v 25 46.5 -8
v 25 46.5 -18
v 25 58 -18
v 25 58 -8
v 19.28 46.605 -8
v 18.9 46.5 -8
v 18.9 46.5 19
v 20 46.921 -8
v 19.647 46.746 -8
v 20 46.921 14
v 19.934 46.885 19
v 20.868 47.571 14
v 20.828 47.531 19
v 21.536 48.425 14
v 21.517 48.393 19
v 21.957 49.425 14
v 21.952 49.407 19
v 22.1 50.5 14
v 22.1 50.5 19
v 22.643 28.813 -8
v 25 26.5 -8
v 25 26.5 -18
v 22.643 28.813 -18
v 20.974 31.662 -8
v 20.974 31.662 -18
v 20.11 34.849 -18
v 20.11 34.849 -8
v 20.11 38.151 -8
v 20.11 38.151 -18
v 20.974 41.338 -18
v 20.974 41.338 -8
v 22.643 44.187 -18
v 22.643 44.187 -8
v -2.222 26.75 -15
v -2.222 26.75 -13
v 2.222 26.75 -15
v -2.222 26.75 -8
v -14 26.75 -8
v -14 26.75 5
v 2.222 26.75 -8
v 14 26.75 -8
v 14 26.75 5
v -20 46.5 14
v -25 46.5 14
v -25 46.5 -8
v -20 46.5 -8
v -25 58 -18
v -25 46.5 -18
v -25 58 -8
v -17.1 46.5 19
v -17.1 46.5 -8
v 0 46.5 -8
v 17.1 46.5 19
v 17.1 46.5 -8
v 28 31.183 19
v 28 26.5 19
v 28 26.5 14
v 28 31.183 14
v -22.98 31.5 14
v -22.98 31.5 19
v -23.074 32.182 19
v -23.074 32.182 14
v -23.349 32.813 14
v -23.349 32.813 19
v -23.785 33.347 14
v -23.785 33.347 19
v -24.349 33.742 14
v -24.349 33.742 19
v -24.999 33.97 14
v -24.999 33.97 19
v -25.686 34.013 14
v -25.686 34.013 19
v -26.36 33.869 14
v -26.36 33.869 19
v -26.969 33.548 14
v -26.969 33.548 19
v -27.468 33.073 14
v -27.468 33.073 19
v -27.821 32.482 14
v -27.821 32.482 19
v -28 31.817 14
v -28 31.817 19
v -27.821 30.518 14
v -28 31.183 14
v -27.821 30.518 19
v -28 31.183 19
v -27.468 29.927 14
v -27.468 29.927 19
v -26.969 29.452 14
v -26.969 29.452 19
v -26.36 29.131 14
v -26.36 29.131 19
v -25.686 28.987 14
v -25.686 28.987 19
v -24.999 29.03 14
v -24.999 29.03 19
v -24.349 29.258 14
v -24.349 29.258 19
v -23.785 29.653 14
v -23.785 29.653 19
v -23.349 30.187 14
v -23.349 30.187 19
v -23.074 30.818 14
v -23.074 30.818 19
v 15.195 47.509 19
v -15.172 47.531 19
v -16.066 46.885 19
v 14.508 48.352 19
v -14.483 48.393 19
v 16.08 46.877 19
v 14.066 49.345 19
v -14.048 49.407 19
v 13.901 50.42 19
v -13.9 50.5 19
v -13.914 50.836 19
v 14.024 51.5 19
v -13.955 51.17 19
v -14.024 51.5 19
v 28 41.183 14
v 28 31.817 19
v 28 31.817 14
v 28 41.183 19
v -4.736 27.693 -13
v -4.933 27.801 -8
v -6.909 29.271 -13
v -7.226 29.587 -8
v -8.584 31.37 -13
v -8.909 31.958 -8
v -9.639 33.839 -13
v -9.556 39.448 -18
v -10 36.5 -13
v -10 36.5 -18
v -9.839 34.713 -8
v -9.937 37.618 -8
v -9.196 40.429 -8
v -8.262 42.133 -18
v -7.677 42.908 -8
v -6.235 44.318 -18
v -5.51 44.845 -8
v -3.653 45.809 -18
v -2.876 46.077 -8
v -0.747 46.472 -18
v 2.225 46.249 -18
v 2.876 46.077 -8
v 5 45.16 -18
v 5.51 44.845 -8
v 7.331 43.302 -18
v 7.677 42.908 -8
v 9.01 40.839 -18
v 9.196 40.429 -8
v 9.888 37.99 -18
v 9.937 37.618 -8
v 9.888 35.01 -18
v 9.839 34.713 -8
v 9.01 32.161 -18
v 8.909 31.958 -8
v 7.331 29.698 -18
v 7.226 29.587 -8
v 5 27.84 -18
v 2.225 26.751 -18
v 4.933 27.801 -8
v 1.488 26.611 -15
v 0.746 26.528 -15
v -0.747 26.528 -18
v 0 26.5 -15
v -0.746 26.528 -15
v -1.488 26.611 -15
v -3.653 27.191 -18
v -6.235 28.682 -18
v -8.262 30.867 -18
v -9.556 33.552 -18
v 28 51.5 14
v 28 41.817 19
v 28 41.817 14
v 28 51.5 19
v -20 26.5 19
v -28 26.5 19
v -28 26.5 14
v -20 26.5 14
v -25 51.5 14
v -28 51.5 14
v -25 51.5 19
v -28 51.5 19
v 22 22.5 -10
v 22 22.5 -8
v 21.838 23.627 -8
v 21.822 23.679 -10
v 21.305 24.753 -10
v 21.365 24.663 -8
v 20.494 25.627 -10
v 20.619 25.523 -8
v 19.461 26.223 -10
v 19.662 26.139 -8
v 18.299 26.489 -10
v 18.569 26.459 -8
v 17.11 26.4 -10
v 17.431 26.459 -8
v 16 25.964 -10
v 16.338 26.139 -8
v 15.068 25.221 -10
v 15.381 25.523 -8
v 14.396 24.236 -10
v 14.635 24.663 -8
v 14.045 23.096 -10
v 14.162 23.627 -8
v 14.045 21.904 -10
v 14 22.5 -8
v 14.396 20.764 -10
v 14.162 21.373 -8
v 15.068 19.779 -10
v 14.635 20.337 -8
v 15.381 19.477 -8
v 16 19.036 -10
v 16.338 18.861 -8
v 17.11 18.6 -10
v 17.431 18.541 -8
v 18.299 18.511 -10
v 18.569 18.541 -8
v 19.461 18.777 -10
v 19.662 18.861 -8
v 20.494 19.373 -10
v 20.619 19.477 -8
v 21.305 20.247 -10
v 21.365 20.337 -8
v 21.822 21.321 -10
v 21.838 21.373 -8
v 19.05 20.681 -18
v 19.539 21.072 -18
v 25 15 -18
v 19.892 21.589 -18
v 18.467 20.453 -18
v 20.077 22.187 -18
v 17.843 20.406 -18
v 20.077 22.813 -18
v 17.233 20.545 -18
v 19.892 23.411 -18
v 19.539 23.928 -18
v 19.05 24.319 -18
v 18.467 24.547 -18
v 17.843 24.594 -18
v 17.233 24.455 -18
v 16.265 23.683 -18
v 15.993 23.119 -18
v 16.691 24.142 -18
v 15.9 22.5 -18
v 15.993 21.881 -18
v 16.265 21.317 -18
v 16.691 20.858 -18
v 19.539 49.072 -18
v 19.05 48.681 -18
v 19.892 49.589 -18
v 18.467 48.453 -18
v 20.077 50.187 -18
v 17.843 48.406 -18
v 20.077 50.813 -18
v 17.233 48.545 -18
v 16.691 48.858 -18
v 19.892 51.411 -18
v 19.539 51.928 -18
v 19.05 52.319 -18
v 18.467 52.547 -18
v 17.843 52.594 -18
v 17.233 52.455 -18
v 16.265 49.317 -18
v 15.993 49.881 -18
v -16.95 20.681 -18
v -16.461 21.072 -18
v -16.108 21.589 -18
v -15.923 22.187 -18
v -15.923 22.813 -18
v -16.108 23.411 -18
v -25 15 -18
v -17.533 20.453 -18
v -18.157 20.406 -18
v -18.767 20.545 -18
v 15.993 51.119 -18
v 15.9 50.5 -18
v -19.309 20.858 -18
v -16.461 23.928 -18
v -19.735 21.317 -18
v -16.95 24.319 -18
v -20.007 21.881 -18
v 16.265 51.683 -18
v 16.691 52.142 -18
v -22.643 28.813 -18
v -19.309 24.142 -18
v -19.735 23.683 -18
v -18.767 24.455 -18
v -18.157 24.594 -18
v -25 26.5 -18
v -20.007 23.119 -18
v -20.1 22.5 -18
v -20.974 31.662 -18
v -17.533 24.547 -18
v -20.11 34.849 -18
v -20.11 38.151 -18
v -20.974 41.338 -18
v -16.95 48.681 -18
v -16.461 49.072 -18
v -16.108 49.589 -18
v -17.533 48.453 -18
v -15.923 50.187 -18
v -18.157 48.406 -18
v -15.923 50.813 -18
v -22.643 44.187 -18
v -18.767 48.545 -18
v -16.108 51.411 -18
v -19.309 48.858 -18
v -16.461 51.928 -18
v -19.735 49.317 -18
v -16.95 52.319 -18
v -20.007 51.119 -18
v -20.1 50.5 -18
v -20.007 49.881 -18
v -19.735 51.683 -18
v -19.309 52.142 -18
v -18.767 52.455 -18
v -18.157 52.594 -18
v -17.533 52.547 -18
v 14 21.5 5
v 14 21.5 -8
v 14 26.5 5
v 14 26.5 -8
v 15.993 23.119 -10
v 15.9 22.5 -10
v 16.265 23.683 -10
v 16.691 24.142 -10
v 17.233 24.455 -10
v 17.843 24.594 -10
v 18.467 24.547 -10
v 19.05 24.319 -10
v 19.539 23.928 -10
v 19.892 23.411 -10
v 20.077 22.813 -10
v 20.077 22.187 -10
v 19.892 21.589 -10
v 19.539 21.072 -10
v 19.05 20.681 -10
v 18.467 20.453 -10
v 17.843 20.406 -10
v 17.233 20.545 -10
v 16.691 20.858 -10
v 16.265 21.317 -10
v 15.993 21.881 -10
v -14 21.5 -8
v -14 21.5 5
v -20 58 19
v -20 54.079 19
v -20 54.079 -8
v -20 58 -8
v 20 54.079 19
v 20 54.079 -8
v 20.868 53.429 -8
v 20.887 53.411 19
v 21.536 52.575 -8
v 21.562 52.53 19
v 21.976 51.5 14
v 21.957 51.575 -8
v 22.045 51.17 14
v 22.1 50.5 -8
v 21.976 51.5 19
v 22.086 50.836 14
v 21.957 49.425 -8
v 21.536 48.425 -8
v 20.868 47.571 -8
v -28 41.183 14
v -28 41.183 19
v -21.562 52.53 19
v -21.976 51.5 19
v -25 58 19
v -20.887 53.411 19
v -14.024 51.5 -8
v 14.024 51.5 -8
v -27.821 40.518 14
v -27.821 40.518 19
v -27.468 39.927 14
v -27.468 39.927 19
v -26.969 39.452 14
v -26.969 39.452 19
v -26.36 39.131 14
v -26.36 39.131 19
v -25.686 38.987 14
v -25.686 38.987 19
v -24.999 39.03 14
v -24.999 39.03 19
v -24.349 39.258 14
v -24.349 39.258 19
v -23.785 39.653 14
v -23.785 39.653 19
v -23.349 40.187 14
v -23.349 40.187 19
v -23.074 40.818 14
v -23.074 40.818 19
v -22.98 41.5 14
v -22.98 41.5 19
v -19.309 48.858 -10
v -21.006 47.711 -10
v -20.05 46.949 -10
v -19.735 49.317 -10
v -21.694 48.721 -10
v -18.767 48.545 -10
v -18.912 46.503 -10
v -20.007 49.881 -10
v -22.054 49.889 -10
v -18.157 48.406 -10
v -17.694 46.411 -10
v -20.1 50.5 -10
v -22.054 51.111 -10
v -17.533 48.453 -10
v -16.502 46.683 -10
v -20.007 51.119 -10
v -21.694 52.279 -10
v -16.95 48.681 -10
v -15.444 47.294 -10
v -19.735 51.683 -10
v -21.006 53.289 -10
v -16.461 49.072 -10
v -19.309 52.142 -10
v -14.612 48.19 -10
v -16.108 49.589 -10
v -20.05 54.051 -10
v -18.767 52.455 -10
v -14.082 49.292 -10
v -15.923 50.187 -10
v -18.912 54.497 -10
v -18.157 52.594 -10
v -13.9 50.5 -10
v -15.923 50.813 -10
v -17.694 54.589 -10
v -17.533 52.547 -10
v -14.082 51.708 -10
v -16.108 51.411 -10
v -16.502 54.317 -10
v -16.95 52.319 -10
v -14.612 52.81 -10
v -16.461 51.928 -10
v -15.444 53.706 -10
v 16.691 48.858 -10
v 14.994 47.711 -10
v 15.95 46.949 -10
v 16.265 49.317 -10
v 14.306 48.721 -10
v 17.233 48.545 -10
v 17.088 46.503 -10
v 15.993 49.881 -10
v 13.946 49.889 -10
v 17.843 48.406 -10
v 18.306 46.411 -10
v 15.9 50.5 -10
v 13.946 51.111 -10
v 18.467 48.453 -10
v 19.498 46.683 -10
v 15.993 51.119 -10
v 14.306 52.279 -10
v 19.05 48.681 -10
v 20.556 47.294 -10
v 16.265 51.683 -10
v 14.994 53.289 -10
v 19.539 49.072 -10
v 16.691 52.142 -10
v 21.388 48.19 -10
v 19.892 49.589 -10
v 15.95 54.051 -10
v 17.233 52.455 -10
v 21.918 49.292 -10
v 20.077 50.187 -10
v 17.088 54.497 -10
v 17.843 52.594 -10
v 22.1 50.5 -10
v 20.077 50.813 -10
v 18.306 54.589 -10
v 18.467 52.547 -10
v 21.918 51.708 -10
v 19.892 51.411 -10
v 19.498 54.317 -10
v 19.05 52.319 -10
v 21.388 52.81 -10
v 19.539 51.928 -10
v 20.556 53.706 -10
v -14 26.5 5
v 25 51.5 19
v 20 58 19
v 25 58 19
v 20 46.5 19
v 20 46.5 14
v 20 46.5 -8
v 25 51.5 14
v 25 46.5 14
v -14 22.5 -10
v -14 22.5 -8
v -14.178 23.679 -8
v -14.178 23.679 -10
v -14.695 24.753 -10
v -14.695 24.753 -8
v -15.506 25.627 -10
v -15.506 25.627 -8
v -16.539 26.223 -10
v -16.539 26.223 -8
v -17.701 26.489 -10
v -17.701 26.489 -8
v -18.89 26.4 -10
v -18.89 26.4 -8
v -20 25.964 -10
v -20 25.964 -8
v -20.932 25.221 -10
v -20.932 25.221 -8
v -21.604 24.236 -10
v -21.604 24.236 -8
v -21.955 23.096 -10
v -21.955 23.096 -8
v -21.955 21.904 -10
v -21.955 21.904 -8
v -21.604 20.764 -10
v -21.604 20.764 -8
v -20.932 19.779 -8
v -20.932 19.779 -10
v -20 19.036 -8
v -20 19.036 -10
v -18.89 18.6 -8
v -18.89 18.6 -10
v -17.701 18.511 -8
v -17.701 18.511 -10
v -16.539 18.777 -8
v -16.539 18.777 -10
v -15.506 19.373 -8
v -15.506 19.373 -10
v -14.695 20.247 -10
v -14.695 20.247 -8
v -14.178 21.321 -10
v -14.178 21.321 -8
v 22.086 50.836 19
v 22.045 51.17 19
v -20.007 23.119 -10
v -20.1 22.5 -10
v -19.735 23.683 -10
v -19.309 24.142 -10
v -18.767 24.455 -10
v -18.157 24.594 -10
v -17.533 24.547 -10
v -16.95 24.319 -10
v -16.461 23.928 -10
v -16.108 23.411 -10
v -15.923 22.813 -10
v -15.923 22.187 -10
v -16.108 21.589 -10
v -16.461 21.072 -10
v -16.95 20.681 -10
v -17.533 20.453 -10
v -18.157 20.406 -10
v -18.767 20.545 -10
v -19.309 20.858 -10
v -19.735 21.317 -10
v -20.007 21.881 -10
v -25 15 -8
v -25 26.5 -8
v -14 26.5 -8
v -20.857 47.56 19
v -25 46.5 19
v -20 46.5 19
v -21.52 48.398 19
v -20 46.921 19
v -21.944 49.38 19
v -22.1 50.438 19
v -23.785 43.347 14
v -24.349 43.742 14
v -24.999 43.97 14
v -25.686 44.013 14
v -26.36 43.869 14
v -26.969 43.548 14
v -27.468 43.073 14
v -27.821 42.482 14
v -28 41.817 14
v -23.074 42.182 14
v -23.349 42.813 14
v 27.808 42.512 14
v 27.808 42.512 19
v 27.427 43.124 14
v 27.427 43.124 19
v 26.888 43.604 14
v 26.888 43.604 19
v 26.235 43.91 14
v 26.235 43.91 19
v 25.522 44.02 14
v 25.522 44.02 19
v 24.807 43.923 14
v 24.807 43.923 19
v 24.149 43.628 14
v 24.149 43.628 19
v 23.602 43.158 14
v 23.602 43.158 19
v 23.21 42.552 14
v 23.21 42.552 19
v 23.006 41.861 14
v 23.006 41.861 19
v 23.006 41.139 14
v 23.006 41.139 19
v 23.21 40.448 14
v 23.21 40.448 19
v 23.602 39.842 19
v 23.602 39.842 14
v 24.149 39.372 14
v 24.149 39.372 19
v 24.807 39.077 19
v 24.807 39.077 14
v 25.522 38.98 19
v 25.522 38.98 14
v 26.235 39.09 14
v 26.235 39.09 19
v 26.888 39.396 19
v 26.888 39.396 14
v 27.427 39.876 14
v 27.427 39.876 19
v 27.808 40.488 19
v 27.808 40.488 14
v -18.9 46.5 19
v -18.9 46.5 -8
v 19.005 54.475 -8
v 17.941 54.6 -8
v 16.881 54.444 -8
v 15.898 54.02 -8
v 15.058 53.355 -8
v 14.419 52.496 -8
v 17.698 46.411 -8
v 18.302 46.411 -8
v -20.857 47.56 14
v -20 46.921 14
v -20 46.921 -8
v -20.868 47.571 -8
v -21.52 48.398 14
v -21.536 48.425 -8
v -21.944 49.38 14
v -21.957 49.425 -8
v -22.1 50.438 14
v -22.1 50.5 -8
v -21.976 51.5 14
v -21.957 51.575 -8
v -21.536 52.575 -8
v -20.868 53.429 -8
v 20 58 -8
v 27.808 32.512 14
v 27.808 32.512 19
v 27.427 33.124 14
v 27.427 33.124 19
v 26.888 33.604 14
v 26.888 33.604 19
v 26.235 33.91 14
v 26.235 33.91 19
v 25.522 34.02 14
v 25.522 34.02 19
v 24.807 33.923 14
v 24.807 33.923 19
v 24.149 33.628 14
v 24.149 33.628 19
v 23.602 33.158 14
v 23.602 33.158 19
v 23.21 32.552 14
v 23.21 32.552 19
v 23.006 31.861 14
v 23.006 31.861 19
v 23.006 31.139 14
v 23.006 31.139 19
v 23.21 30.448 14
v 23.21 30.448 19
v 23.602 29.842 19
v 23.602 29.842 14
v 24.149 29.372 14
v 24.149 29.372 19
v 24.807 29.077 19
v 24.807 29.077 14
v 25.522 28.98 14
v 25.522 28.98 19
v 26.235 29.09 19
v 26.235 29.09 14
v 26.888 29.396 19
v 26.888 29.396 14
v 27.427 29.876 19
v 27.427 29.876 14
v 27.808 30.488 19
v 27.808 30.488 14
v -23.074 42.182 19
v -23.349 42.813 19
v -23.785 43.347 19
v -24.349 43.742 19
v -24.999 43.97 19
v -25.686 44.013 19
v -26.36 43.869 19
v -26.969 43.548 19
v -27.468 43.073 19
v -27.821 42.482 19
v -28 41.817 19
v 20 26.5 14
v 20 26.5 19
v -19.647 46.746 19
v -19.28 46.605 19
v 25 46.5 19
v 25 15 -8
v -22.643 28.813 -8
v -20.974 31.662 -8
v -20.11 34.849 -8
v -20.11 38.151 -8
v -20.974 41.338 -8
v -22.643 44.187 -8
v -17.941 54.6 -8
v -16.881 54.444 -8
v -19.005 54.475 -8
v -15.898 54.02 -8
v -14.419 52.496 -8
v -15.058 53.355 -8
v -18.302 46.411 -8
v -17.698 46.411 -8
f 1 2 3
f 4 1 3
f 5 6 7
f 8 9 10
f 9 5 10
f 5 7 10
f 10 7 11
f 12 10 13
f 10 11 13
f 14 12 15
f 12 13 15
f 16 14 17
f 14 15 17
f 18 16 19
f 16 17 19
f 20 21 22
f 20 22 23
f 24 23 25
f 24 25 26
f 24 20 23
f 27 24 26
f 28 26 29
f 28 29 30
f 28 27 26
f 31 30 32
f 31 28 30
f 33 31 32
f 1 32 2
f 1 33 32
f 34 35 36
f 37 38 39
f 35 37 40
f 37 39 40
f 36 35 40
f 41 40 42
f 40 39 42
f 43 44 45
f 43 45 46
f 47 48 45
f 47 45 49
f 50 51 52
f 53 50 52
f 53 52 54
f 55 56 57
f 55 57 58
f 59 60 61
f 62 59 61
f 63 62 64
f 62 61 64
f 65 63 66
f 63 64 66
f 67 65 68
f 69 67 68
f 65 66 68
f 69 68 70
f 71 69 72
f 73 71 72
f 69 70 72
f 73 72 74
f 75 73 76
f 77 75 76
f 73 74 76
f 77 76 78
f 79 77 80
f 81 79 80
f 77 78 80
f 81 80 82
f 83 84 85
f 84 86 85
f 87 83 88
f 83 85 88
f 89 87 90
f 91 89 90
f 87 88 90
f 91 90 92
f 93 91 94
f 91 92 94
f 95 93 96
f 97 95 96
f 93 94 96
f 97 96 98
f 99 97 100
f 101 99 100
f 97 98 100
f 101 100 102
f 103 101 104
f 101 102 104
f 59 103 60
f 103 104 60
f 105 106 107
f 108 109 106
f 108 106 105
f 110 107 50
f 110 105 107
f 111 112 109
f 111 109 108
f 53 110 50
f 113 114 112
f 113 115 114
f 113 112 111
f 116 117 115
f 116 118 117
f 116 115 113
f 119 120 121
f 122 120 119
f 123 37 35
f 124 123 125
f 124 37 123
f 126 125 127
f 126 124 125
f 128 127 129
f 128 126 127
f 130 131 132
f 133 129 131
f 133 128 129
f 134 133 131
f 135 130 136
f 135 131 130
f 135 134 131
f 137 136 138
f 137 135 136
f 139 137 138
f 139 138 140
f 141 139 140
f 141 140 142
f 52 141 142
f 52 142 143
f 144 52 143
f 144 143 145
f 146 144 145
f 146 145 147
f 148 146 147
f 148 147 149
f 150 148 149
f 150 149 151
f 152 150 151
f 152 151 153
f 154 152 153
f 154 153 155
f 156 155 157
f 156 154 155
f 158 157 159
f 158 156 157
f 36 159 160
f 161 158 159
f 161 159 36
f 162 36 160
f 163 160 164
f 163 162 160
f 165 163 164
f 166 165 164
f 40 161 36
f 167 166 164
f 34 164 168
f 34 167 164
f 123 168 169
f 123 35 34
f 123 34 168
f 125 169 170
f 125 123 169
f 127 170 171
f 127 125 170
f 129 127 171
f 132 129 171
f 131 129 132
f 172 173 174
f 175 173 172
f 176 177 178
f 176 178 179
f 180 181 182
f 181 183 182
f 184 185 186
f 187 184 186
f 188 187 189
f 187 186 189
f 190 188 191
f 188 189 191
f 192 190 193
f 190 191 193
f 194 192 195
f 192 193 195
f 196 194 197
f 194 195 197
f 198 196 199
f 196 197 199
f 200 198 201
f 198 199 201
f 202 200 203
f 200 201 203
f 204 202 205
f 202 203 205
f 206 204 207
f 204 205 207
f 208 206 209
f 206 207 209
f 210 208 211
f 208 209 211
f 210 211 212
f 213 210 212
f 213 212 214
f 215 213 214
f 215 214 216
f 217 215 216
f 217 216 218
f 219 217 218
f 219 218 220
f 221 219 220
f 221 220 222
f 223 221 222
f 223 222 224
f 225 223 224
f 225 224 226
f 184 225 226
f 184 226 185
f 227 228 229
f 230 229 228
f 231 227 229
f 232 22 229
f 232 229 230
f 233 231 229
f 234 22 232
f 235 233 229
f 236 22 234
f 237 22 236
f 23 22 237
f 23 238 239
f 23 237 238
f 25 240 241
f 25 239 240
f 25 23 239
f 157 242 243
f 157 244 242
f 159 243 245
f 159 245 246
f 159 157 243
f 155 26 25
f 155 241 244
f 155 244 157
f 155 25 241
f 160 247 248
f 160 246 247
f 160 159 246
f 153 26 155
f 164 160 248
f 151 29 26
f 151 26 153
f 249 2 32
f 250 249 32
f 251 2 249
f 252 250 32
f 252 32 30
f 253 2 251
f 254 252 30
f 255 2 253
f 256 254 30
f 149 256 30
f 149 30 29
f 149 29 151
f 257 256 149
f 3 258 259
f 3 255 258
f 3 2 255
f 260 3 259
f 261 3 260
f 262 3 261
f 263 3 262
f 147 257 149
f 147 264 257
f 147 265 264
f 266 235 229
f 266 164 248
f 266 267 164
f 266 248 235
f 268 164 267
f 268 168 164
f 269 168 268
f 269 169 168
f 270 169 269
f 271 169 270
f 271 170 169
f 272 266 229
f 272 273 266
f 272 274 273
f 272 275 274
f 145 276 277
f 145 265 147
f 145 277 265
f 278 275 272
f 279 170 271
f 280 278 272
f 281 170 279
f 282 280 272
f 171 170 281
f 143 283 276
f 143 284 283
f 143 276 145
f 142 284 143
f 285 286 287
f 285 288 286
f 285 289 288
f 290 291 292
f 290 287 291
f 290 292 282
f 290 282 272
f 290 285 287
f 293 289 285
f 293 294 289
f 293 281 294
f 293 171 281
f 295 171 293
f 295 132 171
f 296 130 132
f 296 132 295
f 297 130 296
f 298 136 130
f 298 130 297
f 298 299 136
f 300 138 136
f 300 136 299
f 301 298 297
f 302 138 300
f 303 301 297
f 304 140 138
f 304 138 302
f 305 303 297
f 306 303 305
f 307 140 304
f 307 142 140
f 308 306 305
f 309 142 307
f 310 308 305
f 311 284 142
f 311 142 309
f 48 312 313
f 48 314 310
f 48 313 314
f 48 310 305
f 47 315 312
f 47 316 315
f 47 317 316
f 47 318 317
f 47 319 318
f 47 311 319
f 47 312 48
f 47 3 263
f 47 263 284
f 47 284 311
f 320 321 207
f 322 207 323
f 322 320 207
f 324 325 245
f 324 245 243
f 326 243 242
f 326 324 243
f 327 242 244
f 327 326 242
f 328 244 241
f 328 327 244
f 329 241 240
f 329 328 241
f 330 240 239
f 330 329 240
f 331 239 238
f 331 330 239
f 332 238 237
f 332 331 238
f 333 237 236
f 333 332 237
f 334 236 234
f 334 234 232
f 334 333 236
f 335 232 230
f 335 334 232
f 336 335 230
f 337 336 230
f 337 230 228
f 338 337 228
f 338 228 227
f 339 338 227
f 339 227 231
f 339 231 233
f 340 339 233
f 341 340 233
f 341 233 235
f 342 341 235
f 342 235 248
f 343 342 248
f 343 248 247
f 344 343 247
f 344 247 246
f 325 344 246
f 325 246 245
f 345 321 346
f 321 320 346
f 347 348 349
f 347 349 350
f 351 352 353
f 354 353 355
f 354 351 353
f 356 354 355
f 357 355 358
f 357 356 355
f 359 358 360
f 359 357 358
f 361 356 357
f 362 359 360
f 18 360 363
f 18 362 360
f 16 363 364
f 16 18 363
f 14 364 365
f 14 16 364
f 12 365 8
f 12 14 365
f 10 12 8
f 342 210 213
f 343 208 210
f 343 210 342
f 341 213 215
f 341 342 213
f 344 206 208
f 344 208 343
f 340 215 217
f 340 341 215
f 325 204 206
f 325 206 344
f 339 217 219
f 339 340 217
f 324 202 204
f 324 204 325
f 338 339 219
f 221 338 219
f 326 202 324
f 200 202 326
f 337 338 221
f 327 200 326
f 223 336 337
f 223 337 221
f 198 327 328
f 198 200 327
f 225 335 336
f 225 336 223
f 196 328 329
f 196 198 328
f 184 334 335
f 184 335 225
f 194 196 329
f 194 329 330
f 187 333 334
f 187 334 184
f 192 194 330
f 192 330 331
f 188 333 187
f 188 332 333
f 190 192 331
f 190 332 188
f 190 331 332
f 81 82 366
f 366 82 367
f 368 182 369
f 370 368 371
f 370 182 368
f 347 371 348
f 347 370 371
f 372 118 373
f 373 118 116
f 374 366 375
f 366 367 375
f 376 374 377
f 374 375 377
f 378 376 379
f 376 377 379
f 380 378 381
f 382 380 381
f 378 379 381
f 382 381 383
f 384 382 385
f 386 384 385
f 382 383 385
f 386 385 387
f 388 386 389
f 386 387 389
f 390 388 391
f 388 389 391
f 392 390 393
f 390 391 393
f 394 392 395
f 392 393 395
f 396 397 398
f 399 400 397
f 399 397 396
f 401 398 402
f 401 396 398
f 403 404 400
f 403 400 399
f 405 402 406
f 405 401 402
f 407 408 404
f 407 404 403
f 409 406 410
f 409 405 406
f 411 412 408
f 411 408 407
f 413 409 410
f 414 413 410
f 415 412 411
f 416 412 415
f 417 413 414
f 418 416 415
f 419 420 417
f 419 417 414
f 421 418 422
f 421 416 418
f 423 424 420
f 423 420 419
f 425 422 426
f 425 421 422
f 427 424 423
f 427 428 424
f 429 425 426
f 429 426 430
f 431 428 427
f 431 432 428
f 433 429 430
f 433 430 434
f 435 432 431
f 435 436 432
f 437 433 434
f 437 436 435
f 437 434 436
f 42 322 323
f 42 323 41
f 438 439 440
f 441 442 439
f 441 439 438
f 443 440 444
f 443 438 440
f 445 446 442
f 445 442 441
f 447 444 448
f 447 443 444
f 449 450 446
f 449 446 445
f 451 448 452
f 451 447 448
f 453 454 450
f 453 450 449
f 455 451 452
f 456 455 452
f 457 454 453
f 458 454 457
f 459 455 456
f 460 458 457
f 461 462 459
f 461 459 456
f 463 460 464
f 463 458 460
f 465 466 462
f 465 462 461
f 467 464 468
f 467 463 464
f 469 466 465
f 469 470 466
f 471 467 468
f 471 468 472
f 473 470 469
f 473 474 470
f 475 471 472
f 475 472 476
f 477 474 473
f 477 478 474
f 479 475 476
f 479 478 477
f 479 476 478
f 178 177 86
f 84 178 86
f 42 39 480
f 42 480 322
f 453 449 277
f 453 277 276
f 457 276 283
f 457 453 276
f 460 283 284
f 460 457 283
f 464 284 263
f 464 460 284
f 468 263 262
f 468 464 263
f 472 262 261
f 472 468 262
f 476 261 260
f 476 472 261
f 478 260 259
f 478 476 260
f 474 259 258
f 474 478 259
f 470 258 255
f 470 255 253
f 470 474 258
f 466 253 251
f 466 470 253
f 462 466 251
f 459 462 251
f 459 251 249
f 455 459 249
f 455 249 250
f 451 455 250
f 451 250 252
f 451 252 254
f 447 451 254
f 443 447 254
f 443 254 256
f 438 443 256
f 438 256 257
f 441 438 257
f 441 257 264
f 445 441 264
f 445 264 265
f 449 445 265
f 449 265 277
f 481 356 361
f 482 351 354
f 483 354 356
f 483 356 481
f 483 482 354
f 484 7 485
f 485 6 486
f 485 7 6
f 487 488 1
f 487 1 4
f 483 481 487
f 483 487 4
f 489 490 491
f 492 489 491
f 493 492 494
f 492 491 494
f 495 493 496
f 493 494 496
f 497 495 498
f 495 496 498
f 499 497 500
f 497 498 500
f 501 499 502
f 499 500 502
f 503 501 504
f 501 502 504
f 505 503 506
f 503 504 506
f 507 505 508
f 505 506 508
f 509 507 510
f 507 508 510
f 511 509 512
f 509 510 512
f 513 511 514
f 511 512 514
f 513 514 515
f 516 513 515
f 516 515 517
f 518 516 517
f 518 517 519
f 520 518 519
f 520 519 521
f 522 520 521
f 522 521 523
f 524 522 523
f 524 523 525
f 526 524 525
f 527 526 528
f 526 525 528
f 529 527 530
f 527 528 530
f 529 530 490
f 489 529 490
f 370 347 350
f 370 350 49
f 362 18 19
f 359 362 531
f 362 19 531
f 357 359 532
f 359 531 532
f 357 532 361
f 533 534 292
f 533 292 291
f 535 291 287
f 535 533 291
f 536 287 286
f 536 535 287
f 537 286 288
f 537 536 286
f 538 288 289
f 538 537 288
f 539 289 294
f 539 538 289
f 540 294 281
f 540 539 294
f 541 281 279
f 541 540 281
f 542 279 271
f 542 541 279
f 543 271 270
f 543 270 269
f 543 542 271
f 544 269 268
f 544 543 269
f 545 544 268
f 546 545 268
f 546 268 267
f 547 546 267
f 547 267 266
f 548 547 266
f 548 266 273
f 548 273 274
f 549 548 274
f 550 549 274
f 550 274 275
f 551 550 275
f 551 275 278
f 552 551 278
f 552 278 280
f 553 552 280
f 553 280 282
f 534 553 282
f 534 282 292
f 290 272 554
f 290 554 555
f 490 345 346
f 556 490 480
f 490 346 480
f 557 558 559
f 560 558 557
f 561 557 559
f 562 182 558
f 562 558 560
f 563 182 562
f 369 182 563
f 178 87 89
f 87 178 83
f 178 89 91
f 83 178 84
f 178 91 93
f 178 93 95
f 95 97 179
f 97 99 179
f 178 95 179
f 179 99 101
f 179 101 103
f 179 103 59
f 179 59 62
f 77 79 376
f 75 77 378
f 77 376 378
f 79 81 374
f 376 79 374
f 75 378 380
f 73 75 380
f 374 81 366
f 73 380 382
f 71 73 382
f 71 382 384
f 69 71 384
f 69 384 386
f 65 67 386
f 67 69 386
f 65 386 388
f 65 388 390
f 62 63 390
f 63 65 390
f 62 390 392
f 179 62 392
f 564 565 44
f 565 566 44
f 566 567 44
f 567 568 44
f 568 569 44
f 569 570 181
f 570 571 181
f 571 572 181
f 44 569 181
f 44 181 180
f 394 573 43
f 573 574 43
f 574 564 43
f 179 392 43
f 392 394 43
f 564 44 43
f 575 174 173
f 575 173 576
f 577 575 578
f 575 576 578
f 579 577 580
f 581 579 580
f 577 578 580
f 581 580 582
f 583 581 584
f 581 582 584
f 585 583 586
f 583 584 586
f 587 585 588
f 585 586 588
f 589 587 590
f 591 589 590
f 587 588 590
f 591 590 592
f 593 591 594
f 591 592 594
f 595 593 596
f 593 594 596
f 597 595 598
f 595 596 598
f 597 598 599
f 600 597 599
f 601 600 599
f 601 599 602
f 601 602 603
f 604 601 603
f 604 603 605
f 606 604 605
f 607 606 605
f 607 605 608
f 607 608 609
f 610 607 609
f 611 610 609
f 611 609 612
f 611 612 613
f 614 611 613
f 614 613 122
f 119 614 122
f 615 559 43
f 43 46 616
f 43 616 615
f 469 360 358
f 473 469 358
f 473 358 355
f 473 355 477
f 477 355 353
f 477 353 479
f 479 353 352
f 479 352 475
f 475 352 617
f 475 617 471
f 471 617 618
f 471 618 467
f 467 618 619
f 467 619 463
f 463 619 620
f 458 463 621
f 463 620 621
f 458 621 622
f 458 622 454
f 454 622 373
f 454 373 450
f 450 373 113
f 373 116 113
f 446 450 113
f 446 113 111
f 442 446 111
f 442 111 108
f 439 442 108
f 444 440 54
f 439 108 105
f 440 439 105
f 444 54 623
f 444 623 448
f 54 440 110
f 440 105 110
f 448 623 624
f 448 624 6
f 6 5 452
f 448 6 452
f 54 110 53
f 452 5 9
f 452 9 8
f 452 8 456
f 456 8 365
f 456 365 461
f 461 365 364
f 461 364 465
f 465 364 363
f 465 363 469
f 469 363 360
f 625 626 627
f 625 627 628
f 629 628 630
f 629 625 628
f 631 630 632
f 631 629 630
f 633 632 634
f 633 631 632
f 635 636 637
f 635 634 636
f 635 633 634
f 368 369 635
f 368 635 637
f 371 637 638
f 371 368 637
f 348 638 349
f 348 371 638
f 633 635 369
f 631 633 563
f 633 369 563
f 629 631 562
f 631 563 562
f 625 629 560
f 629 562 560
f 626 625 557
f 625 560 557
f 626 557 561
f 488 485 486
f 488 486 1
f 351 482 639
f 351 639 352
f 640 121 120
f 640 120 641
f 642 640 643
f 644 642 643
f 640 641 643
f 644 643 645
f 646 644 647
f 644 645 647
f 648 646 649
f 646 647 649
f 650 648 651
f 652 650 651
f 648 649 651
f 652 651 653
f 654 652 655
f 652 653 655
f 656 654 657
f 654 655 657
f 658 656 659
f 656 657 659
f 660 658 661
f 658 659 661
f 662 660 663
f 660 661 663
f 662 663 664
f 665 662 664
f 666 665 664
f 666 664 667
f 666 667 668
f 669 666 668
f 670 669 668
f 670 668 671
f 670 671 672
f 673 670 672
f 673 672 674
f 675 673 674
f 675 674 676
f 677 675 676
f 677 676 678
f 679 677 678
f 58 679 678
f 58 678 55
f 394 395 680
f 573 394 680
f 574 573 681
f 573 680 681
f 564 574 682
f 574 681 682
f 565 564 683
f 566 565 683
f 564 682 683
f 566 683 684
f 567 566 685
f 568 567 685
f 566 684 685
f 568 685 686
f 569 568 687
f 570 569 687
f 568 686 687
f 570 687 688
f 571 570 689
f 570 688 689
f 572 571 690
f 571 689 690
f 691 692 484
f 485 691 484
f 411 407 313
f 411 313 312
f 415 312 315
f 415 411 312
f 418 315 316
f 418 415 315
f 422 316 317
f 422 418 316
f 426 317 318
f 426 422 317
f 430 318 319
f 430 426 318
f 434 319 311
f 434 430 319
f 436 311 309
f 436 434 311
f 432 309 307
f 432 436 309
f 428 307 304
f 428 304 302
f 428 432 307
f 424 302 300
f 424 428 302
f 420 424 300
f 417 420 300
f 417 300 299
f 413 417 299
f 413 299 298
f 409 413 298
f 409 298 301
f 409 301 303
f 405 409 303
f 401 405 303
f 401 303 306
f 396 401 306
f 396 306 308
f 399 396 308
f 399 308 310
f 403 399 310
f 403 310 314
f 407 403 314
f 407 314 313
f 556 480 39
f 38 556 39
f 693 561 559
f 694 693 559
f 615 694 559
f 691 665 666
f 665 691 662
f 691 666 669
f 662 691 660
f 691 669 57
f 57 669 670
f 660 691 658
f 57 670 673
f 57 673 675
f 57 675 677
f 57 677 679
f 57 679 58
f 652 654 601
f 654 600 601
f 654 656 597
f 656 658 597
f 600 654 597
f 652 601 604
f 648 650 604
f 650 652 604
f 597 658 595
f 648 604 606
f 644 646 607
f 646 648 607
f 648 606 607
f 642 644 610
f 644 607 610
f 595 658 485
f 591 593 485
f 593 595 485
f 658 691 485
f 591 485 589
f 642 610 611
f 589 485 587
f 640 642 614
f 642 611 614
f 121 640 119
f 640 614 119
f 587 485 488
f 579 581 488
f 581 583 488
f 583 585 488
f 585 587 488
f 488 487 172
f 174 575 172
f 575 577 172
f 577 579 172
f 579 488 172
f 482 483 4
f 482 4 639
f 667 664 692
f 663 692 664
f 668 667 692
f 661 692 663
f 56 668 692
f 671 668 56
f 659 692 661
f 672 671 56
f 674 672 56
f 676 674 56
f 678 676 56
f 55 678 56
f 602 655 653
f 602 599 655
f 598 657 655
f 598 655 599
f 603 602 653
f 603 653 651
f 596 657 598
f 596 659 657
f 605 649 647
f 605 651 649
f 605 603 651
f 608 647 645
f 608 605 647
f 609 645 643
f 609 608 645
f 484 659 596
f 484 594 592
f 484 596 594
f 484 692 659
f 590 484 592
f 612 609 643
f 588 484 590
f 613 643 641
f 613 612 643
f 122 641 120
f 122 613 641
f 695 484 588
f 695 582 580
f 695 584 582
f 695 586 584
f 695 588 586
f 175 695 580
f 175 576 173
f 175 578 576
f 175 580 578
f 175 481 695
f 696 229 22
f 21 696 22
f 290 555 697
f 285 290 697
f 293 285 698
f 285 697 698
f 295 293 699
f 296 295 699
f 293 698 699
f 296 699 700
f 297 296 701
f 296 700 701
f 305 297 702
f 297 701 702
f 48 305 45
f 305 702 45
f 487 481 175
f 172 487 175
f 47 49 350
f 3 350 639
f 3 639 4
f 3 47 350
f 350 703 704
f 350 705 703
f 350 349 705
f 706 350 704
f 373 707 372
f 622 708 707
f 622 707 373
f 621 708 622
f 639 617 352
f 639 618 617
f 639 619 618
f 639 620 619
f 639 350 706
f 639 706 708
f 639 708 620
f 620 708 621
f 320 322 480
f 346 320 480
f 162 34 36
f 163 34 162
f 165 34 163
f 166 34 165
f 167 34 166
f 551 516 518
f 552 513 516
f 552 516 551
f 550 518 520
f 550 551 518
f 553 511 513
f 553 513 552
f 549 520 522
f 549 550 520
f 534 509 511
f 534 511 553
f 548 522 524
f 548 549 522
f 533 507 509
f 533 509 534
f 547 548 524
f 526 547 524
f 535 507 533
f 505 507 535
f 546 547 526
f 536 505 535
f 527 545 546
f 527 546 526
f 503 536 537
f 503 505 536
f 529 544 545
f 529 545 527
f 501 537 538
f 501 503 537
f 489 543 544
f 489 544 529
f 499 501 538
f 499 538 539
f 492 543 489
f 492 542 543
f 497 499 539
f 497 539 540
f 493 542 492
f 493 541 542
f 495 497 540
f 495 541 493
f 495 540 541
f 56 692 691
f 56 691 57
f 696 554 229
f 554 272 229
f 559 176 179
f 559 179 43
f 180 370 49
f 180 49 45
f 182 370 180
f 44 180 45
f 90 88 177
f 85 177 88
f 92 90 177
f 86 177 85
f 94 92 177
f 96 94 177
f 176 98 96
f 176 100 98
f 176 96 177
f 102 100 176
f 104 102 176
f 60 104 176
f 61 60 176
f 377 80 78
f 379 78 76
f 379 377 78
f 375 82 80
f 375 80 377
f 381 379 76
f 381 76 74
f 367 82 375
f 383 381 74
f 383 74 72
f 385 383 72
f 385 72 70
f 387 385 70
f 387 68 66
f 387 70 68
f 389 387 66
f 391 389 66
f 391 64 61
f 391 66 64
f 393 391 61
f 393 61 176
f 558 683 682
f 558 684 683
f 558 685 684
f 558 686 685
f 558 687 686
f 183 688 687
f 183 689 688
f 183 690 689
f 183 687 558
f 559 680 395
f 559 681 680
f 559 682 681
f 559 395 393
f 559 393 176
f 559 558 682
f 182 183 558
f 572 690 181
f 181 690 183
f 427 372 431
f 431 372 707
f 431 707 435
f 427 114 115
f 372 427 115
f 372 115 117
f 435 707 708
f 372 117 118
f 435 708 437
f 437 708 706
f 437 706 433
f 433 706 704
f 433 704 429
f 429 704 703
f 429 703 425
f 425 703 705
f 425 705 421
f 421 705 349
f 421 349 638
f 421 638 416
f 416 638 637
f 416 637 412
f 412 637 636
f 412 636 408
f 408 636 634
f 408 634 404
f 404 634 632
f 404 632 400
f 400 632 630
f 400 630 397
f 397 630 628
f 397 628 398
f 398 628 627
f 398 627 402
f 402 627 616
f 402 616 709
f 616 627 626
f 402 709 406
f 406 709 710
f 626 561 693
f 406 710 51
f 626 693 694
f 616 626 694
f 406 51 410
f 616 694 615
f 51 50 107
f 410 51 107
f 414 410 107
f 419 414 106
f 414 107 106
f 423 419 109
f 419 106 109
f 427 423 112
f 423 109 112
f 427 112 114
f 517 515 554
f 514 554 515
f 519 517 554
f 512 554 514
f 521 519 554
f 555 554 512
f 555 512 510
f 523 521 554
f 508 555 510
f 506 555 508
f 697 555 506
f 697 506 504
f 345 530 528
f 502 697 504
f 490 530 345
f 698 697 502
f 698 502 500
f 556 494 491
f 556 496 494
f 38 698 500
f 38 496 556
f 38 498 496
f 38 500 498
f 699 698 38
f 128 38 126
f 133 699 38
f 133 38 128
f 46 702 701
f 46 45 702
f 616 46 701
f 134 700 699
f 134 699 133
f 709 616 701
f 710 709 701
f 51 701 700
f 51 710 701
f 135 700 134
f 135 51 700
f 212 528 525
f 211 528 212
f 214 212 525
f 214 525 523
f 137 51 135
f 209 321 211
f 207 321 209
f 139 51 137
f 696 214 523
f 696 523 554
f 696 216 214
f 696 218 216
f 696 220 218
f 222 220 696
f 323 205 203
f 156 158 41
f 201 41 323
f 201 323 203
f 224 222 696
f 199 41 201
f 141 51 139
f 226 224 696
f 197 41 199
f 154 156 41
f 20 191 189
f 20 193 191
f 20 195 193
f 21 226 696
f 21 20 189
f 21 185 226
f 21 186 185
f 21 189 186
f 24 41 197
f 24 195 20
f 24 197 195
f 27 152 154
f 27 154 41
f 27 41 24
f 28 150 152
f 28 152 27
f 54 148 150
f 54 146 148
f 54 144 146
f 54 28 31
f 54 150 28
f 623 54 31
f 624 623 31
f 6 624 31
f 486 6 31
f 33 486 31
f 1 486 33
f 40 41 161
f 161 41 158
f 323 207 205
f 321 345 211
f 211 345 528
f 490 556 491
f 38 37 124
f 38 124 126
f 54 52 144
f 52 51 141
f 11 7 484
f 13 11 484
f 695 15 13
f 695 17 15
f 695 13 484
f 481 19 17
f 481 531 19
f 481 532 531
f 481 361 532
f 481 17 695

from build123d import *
from build123d.topology import SkipClean

# Parameters (mm, degrees)
SKETCH_1_R           = 2
EXTRUDE_1_DEPTH      = 5
EXTRUDE_5_DEPTH      = 18
SKETCH_6_W           = 40
SKETCH_6_H           = 5
EXTRUDE_6_DEPTH      = 25
SKETCH_7_W           = 40
SKETCH_7_H           = 5
EXTRUDE_7_DEPTH      = 27
SKETCH_9_R           = 10
CUT_EXTRUDE_4_DEPTH  = 50
SKETCH_10_W          = 8
SKETCH_10_H          = 5
EXTRUDE_9_DEPTH      = 20
CUT_EXTRUDE_8_DEPTH  = 20
CUT_EXTRUDE_9_DEPTH  = 20
SKETCH_16_W          = 40
SKETCH_16_H          = 4
EXTRUDE_10_DEPTH     = 5
SKETCH_17_W          = 40
SKETCH_17_H          = 4
EXTRUDE_12_DEPTH     = 12
SKETCH_18_R          = 1.5
CUT_EXTRUDE_10_DEPTH = 10
CUT_EXTRUDE_11_DEPTH = 10
SKETCH_22_W          = 39.912411086
SKETCH_22_H          = 12
CUT_EXTRUDE_12_DEPTH = 10
SKETCH_23_W          = 1.771441315
SKETCH_23_H          = 1.605869394
CUT_EXTRUDE_13_DEPTH = 10
SKETCH_24_W          = 40
SKETCH_24_H          = 4
EXTRUDE_13_DEPTH     = 7
SKETCH_26_R          = 1.5
CUT_EXTRUDE_14_DEPTH = 7
SKETCH_27_W          = 8
SKETCH_27_H          = 26.5
EXTRUDE_14_DEPTH     = 5
SKETCH_28_W          = 8
SKETCH_28_H          = 25
EXTRUDE_15_DEPTH     = 5
SKETCH_30_W          = 8
SKETCH_30_H          = 1.5
CUT_EXTRUDE_15_DEPTH = 5
SKETCH_31_R          = 2.52
CUT_EXTRUDE_16_DEPTH = 5
SKETCH_32_R          = 2.52
CUT_EXTRUDE_17_DEPTH = 5
CUT_EXTRUDE_18_DEPTH = 5
SKETCH_2_R           = 4
CUT_EXTRUDE_19_DEPTH = 3
SKETCH_35_W          = 4
SKETCH_35_H          = 12
CUT_EXTRUDE_20_DEPTH = 100
SKETCH_37_W          = 50
SKETCH_37_H          = 43
CUT_EXTRUDE_21_DEPTH = 100
SKETCH_38_W          = 50
SKETCH_38_H          = 43
SKETCH_38_R          = 10
EXTRUDE_20_DEPTH     = 5
SKETCH_39_W          = 50
SKETCH_39_H          = 43
SKETCH_39_W_2        = 40
SKETCH_39_H_2        = 30
EXTRUDE_21_DEPTH     = 5
CUT_EXTRUDE_START    = -100
SKETCH_41_R          = 2.1
SKETCH_41_R_2        = 10
CUT_EXTRUDE_23_DEPTH = 100
SKETCH_42_W          = 6
SKETCH_42_H          = 5
CUT_EXTRUDE_24_DEPTH = 13
SKETCH_43_R          = 4.1
CUT_EXTRUDE_27_DEPTH = 29
EXTRUDE_START        = 27
EXTRUDE_22_DEPTH     = 27
EXTRUDE_23_DEPTH     = 27
SKETCH_46_W          = 28
SKETCH_46_H          = 0.25
EXTRUDE_24_DEPTH     = 20
SKETCH_47_R          = 4
CUT_EXTRUDE_28_DEPTH = 2
CUT_EXTRUDE_29_DEPTH = 10
CUT_EXTRUDE_30_DEPTH = 10


with BuildPart() as part:
    # 草图1 → 凸台-拉伸1 (new body)
    with BuildSketch(Plane.XY):
        Polygon((0, 21.5), (25, 21.5), (25, -21.5), (-25, -21.5), (-25, 21.5), align=None)
        with Locations((-18, 14)):
            Circle(SKETCH_1_R, mode=Mode.SUBTRACT)
        with Locations((-18, -14)):
            Circle(SKETCH_1_R, mode=Mode.SUBTRACT)
        with Locations((18, -14)):
            Circle(SKETCH_1_R, mode=Mode.SUBTRACT)
        with Locations((18, 14)):
            Circle(SKETCH_1_R, mode=Mode.SUBTRACT)
    extrude(amount=EXTRUDE_1_DEPTH)

    # 草图5 → 凸台-拉伸5 (add)
    with BuildSketch(Plane.XY.offset(5)):
        Polygon((0, 26.5), (20, 26.5), (20, 21.5), (-20, 21.5), (-20, 26.5), align=None)
    extrude(amount=-EXTRUDE_5_DEPTH)

    # 草图6 → 凸台-拉伸6 (add)
    with BuildSketch(Plane(origin=(0, 26.5, 0), x_dir=(1, 0, 0), z_dir=(0, 1, 0))):
        with Locations((0, 10.5)):
            Rectangle(SKETCH_6_W, SKETCH_6_H)
    extrude(amount=EXTRUDE_6_DEPTH)

    # 草图7 → 凸台-拉伸7 (add)
    with BuildSketch(Plane.XY.offset(-8)):
        with Locations((0, 49)):
            Rectangle(SKETCH_7_W, SKETCH_7_H)
    extrude(amount=EXTRUDE_7_DEPTH)

    # 草图9 → 切除-拉伸4 (cut)
    with BuildSketch(Plane(origin=(0, 0, 0), x_dir=(-1, 0, 0), z_dir=(0, 0, -1))):
        Circle(SKETCH_9_R)
    extrude(amount=-CUT_EXTRUDE_4_DEPTH, mode=Mode.SUBTRACT)

    # 草图10 → 凸台-拉伸9 (add)
    with BuildSketch(Plane(origin=(0, 51.5, 0), x_dir=(1, 0, 0), z_dir=(0, 1, 0))):
        with Locations((-24, -16.5)):
            Rectangle(SKETCH_10_W, SKETCH_10_H)
        with Locations((24, -16.5)):
            Rectangle(SKETCH_10_W, SKETCH_10_H)
    extrude(amount=-EXTRUDE_9_DEPTH)

    # 草图12 → 切除-拉伸8 (cut)
    with BuildSketch(Plane(origin=(0, 0, 14), x_dir=(-1, 0, 0), z_dir=(0, 0, -1))):
        with BuildLine():
            Line((28, 46), (28, 47))
            Line((28, 47), (27.949489743, 47))
            ThreePointArc((27.949489743, 47), (23, 46.5), (27.949489743, 46))
            Line((27.949489743, 46), (28, 46))
        make_face()
        with BuildLine():
            Line((27.949489743, 36), (28, 36))
            Line((28, 36), (28, 37))
            Line((28, 37), (27.949489743, 37))
            ThreePointArc((27.949489743, 37), (23, 36.5), (27.949489743, 36))
        make_face()
    extrude(amount=-CUT_EXTRUDE_8_DEPTH, mode=Mode.SUBTRACT)

    # 草图15 → 切除-拉伸9 (cut)
    with BuildSketch(Plane(origin=(0, 0, 14), x_dir=(-1, 0, 0), z_dir=(0, 0, -1))):
        with BuildLine():
            ThreePointArc((-27.949489743, 46), (-23, 46.5), (-27.949489743, 47))
            Line((-27.949489743, 47), (-28, 47))
            Line((-28, 47), (-28, 46))
            Line((-28, 46), (-27.949489743, 46))
        make_face()
        with BuildLine():
            Line((-27.949489743, 37), (-28, 37))
            Line((-28, 37), (-28, 36))
            Line((-28, 36), (-27.949489743, 36))
            ThreePointArc((-27.949489743, 36), (-23, 36.5), (-27.949489743, 37))
        make_face()
    extrude(amount=-CUT_EXTRUDE_9_DEPTH, mode=Mode.SUBTRACT)

    # 草图16 → 凸台-拉伸10 (add)
    with BuildSketch(Plane(origin=(0, 51.5, 0), x_dir=(1, 0, 0), z_dir=(0, 1, 0))):
        with Locations((0, -21)):
            Rectangle(SKETCH_16_W, SKETCH_16_H)
    extrude(amount=-EXTRUDE_10_DEPTH)

    # 草图17 → 凸台-拉伸12 (add)
    with BuildSketch(Plane(origin=(0, 51.5, 0), x_dir=(1, 0, 0), z_dir=(0, 1, 0))):
        with Locations((0, -21)):
            Rectangle(SKETCH_17_W, SKETCH_17_H)
    extrude(amount=EXTRUDE_12_DEPTH)

    # 草图18 → 切除-拉伸10 (cut)
    with BuildSketch(Plane(origin=(0, 0, 19), x_dir=(-1, 0, 0), z_dir=(0, 0, -1))):
        with Locations((6, 59.5)):
            Circle(SKETCH_18_R)
        with Locations((13, 59.5)):
            Circle(SKETCH_18_R)
    extrude(amount=-CUT_EXTRUDE_10_DEPTH, mode=Mode.SUBTRACT)

    # 草图20 → 切除-拉伸11 (cut)
    with BuildSketch(Plane.XY.offset(23)):
        with BuildLine():
            ThreePointArc((8, 63.5), (16.485281374, 59.985281374), (20, 51.5))
            Line((20, 51.5), (20, 63.5))
            Line((20, 63.5), (8, 63.5))
        make_face()
    extrude(amount=-CUT_EXTRUDE_11_DEPTH, mode=Mode.SUBTRACT)

    # 草图22 → 切除-拉伸12 (cut)
    with BuildSketch(Plane.XY.offset(23)):
        with Locations((-0.043794457, 57.5)):
            Rectangle(SKETCH_22_W, SKETCH_22_H)
    extrude(amount=-CUT_EXTRUDE_12_DEPTH, mode=Mode.SUBTRACT)

    # 草图23 → 切除-拉伸13 (cut)
    with BuildSketch(Plane.XY.offset(23)):
        with Locations((20.269466875, 52.302934697)):
            Rectangle(SKETCH_23_W, SKETCH_23_H)
    extrude(amount=-CUT_EXTRUDE_13_DEPTH, mode=Mode.SUBTRACT)

    # 草图24 → 凸台-拉伸13 (add)
    with BuildSketch(Plane(origin=(0, 51.5, 0), x_dir=(1, 0, 0), z_dir=(0, 1, 0))):
        with Locations((0, -21)):
            Rectangle(SKETCH_24_W, SKETCH_24_H)
    extrude(amount=EXTRUDE_13_DEPTH)

    # 草图26 → 切除-拉伸14 (cut)
    with BuildSketch(Plane.XY.offset(23)):
        with Locations((-13, 54.5)):
            Circle(SKETCH_26_R)
        with Locations((-6, 54.5)):
            Circle(SKETCH_26_R)
    extrude(amount=-CUT_EXTRUDE_14_DEPTH, mode=Mode.SUBTRACT)

    # 草图27 → 凸台-拉伸14 (add)
    with BuildSketch(Plane.XY.offset(19)):
        with Locations((24, 38.25)):
            Rectangle(SKETCH_27_W, SKETCH_27_H)
    extrude(amount=-EXTRUDE_14_DEPTH)

    # 草图28 → 凸台-拉伸15 (add)
    with BuildSketch(Plane.XY.offset(19)):
        with Locations((-24, 39)):
            Rectangle(SKETCH_28_W, SKETCH_28_H)
    extrude(amount=-EXTRUDE_15_DEPTH)

    # 草图30 → 切除-拉伸15 (cut)
    with BuildSketch(Plane.XY.offset(19)):
        with Locations((24, 25.75)):
            Rectangle(SKETCH_30_W, SKETCH_30_H)
    extrude(amount=-CUT_EXTRUDE_15_DEPTH, mode=Mode.SUBTRACT)

    # 草图31 → 切除-拉伸16 (cut)
    with BuildSketch(Plane.XY.offset(19)):
        with Locations((25.5, 41.5)):
            Circle(SKETCH_31_R)
        with Locations((25.5, 31.5)):
            Circle(SKETCH_31_R)
    extrude(amount=-CUT_EXTRUDE_16_DEPTH, mode=Mode.SUBTRACT)

    # 草图32 → 切除-拉伸17 (cut)
    with BuildSketch(Plane.XY.offset(19)):
        with Locations((-25.5, 41.5)):
            Circle(SKETCH_32_R)
        with Locations((-25.5, 31.5)):
            Circle(SKETCH_32_R)
    extrude(amount=-CUT_EXTRUDE_17_DEPTH, mode=Mode.SUBTRACT)

    # 草图33 → 切除-拉伸18 (cut)
    with BuildSketch(Plane(origin=(0, 0, 19), x_dir=(-1, 0, 0), z_dir=(0, 0, -1))):
        with BuildLine():
            Line((-20, 58.5), (-20, 51.5))
            ThreePointArc((-20, 51.5), (-17.949747468, 56.449747468), (-13, 58.5))
            Line((-13, 58.5), (-20, 58.5))
        make_face()
        with BuildLine():
            Line((20, 58.5), (13, 58.5))
            ThreePointArc((13, 58.5), (17.949747468, 56.449747468), (20, 51.5))
            Line((20, 51.5), (20, 58.5))
        make_face()
    extrude(amount=-CUT_EXTRUDE_18_DEPTH, mode=Mode.SUBTRACT)

    # 草图2 → 切除-拉伸19 (cut)
    with BuildSketch(Plane.XY.offset(5)):
        with Locations((18, 14)):
            Circle(SKETCH_2_R)
        with Locations((-18, 14)):
            Circle(SKETCH_2_R)
        with Locations((-18, -14)):
            Circle(SKETCH_2_R)
        with Locations((18, -14)):
            Circle(SKETCH_2_R)
    extrude(amount=-CUT_EXTRUDE_19_DEPTH, mode=Mode.SUBTRACT)

    # 草图35 → 切除-拉伸20 (cut)
    with BuildSketch(Plane.ZY.offset(20)):
        with Locations((21, 52.5)):
            Rectangle(SKETCH_35_W, SKETCH_35_H)
    extrude(amount=-CUT_EXTRUDE_20_DEPTH, mode=Mode.SUBTRACT)

    # 草图37 → 切除-拉伸21 (cut)
    with BuildSketch(Plane.XY.offset(5)):
        Rectangle(SKETCH_37_W, SKETCH_37_H)
    extrude(amount=-CUT_EXTRUDE_21_DEPTH, mode=Mode.SUBTRACT)

    # 草图38 → 凸台-拉伸20 (add)
    with BuildSketch(Plane(origin=(0, 0, -13), x_dir=(-1, 0, 0), z_dir=(0, 0, -1))):
        with Locations((0, 36.5)):
            Rectangle(SKETCH_38_W, SKETCH_38_H)
        with Locations((0, 36.5)):
            Circle(SKETCH_38_R, mode=Mode.SUBTRACT)
    extrude(amount=EXTRUDE_20_DEPTH)

    # 草图39 → 凸台-拉伸21 (add)
    with BuildSketch(Plane.XY.offset(-13)):
        with Locations((0, 36.5)):
            Rectangle(SKETCH_39_W, SKETCH_39_H)
        with Locations((0, 36.5)):
            Rectangle(SKETCH_39_W_2, SKETCH_39_H_2, mode=Mode.SUBTRACT)
    extrude(amount=EXTRUDE_21_DEPTH)

    # 草图41 → 切除-拉伸23 (cut)
    with BuildSketch(Plane(origin=(0, 0, -18), x_dir=(-1, 0, 0), z_dir=(0, 0, -1)).offset(CUT_EXTRUDE_START)):
        with Locations((-18, 50.5)):
            Circle(SKETCH_41_R)
        with Locations((18, 50.5)):
            Circle(SKETCH_41_R)
        with Locations((18, 22.5)):
            Circle(SKETCH_41_R)
        with Locations((-18, 22.5)):
            Circle(SKETCH_41_R)
        with Locations(Location((0, 36.5, 0), (0, 0, 270))):
            Circle(SKETCH_41_R_2)
    extrude(amount=CUT_EXTRUDE_23_DEPTH, mode=Mode.SUBTRACT)

    # 草图42 → 切除-拉伸24 (cut)
    with BuildSketch(Plane.XY.offset(5)):
        with Locations((-17, 24)):
            Rectangle(SKETCH_42_W, SKETCH_42_H)
        with Locations((17, 24)):
            Rectangle(SKETCH_42_W, SKETCH_42_H)
    extrude(amount=-CUT_EXTRUDE_24_DEPTH, mode=Mode.SUBTRACT)

    # 草图43 → 切除-拉伸27 (cut)
    with BuildSketch(Plane.XY.offset(19)):
        with Locations((-18, 50.5)):
            Circle(SKETCH_43_R)
        with Locations((18, 50.5)):
            Circle(SKETCH_43_R)
    extrude(amount=-CUT_EXTRUDE_27_DEPTH, mode=Mode.SUBTRACT)

    # 草图44 → 凸台-拉伸22 (add)
    with SkipClean():  # the faces are left unmerged after this step: merging them gives an invalid solid
        with BuildSketch(Plane.XY.offset(-8).offset(EXTRUDE_START)):
            with BuildLine():
                Line((-25, 46.5), (-20, 46.5))
                Line((-20, 46.5), (-20, 46.920893966))
                ThreePointArc((-20, 46.920893966), (-22.1, 50.5), (-20, 54.079106034))
                Line((-20, 54.079106034), (-20, 58))
                Line((-20, 58), (-25, 58))
                Line((-25, 58), (-25, 46.5))
            make_face()
        extrude(amount=-EXTRUDE_22_DEPTH)

    # 草图45 → 凸台-拉伸23 (add)
    with SkipClean():  # the faces are left unmerged after this step: merging them gives an invalid solid
        with BuildSketch(Plane.XY.offset(-8).offset(EXTRUDE_START)):
            with BuildLine():
                Line((18.9, 46.5), (25, 46.5))
                Line((25, 46.5), (25, 58))
                Line((25, 58), (20, 58))
                Line((20, 58), (20, 54.079106034))
                ThreePointArc((20, 54.079106034), (22.057488307, 49.911112372), (18.9, 46.5))
            make_face()
        extrude(amount=-EXTRUDE_23_DEPTH)

    # 草图46 → 凸台-拉伸24 (add)
    with SkipClean():  # the faces are left unmerged after this step: merging them gives an invalid solid
        with BuildSketch(Plane.XY.offset(5)):
            with Locations((0, 26.625)):
                Rectangle(SKETCH_46_W, SKETCH_46_H)
        extrude(amount=-EXTRUDE_24_DEPTH)

    # 草图47 → 切除-拉伸28 (cut)
    with SkipClean():  # the faces are left unmerged after this step: merging them gives an invalid solid
        with BuildSketch(Plane.XY.offset(-8)):
            with Locations((-18, 22.5)):
                Circle(SKETCH_47_R)
            with Locations((18, 22.5)):
                Circle(SKETCH_47_R)
        extrude(amount=-CUT_EXTRUDE_28_DEPTH, mode=Mode.SUBTRACT)

    # 草图48 → 切除-拉伸29 (cut)
    with SkipClean():  # the faces are left unmerged after this step: merging them gives an invalid solid
        with BuildSketch(Plane.XY.offset(-8)):
            with BuildLine():
                Line((-25, 46.5), (-25, 26.5))
                ThreePointArc((-25, 26.5), (-19.999999498, 36.5), (-25, 46.5))
            make_face()
        extrude(amount=-CUT_EXTRUDE_29_DEPTH, mode=Mode.SUBTRACT)

    # 草图49 → 切除-拉伸30 (cut)
    with SkipClean():  # the faces are left unmerged after this step: merging them gives an invalid solid
        with BuildSketch(Plane.XY.offset(-8)):
            with BuildLine():
                Line((25, 46.5), (25, 26.5))
                ThreePointArc((25, 26.5), (20, 36.5), (25, 46.5))
            make_face()
        extrude(amount=-CUT_EXTRUDE_30_DEPTH, mode=Mode.SUBTRACT)


solid = part.part
